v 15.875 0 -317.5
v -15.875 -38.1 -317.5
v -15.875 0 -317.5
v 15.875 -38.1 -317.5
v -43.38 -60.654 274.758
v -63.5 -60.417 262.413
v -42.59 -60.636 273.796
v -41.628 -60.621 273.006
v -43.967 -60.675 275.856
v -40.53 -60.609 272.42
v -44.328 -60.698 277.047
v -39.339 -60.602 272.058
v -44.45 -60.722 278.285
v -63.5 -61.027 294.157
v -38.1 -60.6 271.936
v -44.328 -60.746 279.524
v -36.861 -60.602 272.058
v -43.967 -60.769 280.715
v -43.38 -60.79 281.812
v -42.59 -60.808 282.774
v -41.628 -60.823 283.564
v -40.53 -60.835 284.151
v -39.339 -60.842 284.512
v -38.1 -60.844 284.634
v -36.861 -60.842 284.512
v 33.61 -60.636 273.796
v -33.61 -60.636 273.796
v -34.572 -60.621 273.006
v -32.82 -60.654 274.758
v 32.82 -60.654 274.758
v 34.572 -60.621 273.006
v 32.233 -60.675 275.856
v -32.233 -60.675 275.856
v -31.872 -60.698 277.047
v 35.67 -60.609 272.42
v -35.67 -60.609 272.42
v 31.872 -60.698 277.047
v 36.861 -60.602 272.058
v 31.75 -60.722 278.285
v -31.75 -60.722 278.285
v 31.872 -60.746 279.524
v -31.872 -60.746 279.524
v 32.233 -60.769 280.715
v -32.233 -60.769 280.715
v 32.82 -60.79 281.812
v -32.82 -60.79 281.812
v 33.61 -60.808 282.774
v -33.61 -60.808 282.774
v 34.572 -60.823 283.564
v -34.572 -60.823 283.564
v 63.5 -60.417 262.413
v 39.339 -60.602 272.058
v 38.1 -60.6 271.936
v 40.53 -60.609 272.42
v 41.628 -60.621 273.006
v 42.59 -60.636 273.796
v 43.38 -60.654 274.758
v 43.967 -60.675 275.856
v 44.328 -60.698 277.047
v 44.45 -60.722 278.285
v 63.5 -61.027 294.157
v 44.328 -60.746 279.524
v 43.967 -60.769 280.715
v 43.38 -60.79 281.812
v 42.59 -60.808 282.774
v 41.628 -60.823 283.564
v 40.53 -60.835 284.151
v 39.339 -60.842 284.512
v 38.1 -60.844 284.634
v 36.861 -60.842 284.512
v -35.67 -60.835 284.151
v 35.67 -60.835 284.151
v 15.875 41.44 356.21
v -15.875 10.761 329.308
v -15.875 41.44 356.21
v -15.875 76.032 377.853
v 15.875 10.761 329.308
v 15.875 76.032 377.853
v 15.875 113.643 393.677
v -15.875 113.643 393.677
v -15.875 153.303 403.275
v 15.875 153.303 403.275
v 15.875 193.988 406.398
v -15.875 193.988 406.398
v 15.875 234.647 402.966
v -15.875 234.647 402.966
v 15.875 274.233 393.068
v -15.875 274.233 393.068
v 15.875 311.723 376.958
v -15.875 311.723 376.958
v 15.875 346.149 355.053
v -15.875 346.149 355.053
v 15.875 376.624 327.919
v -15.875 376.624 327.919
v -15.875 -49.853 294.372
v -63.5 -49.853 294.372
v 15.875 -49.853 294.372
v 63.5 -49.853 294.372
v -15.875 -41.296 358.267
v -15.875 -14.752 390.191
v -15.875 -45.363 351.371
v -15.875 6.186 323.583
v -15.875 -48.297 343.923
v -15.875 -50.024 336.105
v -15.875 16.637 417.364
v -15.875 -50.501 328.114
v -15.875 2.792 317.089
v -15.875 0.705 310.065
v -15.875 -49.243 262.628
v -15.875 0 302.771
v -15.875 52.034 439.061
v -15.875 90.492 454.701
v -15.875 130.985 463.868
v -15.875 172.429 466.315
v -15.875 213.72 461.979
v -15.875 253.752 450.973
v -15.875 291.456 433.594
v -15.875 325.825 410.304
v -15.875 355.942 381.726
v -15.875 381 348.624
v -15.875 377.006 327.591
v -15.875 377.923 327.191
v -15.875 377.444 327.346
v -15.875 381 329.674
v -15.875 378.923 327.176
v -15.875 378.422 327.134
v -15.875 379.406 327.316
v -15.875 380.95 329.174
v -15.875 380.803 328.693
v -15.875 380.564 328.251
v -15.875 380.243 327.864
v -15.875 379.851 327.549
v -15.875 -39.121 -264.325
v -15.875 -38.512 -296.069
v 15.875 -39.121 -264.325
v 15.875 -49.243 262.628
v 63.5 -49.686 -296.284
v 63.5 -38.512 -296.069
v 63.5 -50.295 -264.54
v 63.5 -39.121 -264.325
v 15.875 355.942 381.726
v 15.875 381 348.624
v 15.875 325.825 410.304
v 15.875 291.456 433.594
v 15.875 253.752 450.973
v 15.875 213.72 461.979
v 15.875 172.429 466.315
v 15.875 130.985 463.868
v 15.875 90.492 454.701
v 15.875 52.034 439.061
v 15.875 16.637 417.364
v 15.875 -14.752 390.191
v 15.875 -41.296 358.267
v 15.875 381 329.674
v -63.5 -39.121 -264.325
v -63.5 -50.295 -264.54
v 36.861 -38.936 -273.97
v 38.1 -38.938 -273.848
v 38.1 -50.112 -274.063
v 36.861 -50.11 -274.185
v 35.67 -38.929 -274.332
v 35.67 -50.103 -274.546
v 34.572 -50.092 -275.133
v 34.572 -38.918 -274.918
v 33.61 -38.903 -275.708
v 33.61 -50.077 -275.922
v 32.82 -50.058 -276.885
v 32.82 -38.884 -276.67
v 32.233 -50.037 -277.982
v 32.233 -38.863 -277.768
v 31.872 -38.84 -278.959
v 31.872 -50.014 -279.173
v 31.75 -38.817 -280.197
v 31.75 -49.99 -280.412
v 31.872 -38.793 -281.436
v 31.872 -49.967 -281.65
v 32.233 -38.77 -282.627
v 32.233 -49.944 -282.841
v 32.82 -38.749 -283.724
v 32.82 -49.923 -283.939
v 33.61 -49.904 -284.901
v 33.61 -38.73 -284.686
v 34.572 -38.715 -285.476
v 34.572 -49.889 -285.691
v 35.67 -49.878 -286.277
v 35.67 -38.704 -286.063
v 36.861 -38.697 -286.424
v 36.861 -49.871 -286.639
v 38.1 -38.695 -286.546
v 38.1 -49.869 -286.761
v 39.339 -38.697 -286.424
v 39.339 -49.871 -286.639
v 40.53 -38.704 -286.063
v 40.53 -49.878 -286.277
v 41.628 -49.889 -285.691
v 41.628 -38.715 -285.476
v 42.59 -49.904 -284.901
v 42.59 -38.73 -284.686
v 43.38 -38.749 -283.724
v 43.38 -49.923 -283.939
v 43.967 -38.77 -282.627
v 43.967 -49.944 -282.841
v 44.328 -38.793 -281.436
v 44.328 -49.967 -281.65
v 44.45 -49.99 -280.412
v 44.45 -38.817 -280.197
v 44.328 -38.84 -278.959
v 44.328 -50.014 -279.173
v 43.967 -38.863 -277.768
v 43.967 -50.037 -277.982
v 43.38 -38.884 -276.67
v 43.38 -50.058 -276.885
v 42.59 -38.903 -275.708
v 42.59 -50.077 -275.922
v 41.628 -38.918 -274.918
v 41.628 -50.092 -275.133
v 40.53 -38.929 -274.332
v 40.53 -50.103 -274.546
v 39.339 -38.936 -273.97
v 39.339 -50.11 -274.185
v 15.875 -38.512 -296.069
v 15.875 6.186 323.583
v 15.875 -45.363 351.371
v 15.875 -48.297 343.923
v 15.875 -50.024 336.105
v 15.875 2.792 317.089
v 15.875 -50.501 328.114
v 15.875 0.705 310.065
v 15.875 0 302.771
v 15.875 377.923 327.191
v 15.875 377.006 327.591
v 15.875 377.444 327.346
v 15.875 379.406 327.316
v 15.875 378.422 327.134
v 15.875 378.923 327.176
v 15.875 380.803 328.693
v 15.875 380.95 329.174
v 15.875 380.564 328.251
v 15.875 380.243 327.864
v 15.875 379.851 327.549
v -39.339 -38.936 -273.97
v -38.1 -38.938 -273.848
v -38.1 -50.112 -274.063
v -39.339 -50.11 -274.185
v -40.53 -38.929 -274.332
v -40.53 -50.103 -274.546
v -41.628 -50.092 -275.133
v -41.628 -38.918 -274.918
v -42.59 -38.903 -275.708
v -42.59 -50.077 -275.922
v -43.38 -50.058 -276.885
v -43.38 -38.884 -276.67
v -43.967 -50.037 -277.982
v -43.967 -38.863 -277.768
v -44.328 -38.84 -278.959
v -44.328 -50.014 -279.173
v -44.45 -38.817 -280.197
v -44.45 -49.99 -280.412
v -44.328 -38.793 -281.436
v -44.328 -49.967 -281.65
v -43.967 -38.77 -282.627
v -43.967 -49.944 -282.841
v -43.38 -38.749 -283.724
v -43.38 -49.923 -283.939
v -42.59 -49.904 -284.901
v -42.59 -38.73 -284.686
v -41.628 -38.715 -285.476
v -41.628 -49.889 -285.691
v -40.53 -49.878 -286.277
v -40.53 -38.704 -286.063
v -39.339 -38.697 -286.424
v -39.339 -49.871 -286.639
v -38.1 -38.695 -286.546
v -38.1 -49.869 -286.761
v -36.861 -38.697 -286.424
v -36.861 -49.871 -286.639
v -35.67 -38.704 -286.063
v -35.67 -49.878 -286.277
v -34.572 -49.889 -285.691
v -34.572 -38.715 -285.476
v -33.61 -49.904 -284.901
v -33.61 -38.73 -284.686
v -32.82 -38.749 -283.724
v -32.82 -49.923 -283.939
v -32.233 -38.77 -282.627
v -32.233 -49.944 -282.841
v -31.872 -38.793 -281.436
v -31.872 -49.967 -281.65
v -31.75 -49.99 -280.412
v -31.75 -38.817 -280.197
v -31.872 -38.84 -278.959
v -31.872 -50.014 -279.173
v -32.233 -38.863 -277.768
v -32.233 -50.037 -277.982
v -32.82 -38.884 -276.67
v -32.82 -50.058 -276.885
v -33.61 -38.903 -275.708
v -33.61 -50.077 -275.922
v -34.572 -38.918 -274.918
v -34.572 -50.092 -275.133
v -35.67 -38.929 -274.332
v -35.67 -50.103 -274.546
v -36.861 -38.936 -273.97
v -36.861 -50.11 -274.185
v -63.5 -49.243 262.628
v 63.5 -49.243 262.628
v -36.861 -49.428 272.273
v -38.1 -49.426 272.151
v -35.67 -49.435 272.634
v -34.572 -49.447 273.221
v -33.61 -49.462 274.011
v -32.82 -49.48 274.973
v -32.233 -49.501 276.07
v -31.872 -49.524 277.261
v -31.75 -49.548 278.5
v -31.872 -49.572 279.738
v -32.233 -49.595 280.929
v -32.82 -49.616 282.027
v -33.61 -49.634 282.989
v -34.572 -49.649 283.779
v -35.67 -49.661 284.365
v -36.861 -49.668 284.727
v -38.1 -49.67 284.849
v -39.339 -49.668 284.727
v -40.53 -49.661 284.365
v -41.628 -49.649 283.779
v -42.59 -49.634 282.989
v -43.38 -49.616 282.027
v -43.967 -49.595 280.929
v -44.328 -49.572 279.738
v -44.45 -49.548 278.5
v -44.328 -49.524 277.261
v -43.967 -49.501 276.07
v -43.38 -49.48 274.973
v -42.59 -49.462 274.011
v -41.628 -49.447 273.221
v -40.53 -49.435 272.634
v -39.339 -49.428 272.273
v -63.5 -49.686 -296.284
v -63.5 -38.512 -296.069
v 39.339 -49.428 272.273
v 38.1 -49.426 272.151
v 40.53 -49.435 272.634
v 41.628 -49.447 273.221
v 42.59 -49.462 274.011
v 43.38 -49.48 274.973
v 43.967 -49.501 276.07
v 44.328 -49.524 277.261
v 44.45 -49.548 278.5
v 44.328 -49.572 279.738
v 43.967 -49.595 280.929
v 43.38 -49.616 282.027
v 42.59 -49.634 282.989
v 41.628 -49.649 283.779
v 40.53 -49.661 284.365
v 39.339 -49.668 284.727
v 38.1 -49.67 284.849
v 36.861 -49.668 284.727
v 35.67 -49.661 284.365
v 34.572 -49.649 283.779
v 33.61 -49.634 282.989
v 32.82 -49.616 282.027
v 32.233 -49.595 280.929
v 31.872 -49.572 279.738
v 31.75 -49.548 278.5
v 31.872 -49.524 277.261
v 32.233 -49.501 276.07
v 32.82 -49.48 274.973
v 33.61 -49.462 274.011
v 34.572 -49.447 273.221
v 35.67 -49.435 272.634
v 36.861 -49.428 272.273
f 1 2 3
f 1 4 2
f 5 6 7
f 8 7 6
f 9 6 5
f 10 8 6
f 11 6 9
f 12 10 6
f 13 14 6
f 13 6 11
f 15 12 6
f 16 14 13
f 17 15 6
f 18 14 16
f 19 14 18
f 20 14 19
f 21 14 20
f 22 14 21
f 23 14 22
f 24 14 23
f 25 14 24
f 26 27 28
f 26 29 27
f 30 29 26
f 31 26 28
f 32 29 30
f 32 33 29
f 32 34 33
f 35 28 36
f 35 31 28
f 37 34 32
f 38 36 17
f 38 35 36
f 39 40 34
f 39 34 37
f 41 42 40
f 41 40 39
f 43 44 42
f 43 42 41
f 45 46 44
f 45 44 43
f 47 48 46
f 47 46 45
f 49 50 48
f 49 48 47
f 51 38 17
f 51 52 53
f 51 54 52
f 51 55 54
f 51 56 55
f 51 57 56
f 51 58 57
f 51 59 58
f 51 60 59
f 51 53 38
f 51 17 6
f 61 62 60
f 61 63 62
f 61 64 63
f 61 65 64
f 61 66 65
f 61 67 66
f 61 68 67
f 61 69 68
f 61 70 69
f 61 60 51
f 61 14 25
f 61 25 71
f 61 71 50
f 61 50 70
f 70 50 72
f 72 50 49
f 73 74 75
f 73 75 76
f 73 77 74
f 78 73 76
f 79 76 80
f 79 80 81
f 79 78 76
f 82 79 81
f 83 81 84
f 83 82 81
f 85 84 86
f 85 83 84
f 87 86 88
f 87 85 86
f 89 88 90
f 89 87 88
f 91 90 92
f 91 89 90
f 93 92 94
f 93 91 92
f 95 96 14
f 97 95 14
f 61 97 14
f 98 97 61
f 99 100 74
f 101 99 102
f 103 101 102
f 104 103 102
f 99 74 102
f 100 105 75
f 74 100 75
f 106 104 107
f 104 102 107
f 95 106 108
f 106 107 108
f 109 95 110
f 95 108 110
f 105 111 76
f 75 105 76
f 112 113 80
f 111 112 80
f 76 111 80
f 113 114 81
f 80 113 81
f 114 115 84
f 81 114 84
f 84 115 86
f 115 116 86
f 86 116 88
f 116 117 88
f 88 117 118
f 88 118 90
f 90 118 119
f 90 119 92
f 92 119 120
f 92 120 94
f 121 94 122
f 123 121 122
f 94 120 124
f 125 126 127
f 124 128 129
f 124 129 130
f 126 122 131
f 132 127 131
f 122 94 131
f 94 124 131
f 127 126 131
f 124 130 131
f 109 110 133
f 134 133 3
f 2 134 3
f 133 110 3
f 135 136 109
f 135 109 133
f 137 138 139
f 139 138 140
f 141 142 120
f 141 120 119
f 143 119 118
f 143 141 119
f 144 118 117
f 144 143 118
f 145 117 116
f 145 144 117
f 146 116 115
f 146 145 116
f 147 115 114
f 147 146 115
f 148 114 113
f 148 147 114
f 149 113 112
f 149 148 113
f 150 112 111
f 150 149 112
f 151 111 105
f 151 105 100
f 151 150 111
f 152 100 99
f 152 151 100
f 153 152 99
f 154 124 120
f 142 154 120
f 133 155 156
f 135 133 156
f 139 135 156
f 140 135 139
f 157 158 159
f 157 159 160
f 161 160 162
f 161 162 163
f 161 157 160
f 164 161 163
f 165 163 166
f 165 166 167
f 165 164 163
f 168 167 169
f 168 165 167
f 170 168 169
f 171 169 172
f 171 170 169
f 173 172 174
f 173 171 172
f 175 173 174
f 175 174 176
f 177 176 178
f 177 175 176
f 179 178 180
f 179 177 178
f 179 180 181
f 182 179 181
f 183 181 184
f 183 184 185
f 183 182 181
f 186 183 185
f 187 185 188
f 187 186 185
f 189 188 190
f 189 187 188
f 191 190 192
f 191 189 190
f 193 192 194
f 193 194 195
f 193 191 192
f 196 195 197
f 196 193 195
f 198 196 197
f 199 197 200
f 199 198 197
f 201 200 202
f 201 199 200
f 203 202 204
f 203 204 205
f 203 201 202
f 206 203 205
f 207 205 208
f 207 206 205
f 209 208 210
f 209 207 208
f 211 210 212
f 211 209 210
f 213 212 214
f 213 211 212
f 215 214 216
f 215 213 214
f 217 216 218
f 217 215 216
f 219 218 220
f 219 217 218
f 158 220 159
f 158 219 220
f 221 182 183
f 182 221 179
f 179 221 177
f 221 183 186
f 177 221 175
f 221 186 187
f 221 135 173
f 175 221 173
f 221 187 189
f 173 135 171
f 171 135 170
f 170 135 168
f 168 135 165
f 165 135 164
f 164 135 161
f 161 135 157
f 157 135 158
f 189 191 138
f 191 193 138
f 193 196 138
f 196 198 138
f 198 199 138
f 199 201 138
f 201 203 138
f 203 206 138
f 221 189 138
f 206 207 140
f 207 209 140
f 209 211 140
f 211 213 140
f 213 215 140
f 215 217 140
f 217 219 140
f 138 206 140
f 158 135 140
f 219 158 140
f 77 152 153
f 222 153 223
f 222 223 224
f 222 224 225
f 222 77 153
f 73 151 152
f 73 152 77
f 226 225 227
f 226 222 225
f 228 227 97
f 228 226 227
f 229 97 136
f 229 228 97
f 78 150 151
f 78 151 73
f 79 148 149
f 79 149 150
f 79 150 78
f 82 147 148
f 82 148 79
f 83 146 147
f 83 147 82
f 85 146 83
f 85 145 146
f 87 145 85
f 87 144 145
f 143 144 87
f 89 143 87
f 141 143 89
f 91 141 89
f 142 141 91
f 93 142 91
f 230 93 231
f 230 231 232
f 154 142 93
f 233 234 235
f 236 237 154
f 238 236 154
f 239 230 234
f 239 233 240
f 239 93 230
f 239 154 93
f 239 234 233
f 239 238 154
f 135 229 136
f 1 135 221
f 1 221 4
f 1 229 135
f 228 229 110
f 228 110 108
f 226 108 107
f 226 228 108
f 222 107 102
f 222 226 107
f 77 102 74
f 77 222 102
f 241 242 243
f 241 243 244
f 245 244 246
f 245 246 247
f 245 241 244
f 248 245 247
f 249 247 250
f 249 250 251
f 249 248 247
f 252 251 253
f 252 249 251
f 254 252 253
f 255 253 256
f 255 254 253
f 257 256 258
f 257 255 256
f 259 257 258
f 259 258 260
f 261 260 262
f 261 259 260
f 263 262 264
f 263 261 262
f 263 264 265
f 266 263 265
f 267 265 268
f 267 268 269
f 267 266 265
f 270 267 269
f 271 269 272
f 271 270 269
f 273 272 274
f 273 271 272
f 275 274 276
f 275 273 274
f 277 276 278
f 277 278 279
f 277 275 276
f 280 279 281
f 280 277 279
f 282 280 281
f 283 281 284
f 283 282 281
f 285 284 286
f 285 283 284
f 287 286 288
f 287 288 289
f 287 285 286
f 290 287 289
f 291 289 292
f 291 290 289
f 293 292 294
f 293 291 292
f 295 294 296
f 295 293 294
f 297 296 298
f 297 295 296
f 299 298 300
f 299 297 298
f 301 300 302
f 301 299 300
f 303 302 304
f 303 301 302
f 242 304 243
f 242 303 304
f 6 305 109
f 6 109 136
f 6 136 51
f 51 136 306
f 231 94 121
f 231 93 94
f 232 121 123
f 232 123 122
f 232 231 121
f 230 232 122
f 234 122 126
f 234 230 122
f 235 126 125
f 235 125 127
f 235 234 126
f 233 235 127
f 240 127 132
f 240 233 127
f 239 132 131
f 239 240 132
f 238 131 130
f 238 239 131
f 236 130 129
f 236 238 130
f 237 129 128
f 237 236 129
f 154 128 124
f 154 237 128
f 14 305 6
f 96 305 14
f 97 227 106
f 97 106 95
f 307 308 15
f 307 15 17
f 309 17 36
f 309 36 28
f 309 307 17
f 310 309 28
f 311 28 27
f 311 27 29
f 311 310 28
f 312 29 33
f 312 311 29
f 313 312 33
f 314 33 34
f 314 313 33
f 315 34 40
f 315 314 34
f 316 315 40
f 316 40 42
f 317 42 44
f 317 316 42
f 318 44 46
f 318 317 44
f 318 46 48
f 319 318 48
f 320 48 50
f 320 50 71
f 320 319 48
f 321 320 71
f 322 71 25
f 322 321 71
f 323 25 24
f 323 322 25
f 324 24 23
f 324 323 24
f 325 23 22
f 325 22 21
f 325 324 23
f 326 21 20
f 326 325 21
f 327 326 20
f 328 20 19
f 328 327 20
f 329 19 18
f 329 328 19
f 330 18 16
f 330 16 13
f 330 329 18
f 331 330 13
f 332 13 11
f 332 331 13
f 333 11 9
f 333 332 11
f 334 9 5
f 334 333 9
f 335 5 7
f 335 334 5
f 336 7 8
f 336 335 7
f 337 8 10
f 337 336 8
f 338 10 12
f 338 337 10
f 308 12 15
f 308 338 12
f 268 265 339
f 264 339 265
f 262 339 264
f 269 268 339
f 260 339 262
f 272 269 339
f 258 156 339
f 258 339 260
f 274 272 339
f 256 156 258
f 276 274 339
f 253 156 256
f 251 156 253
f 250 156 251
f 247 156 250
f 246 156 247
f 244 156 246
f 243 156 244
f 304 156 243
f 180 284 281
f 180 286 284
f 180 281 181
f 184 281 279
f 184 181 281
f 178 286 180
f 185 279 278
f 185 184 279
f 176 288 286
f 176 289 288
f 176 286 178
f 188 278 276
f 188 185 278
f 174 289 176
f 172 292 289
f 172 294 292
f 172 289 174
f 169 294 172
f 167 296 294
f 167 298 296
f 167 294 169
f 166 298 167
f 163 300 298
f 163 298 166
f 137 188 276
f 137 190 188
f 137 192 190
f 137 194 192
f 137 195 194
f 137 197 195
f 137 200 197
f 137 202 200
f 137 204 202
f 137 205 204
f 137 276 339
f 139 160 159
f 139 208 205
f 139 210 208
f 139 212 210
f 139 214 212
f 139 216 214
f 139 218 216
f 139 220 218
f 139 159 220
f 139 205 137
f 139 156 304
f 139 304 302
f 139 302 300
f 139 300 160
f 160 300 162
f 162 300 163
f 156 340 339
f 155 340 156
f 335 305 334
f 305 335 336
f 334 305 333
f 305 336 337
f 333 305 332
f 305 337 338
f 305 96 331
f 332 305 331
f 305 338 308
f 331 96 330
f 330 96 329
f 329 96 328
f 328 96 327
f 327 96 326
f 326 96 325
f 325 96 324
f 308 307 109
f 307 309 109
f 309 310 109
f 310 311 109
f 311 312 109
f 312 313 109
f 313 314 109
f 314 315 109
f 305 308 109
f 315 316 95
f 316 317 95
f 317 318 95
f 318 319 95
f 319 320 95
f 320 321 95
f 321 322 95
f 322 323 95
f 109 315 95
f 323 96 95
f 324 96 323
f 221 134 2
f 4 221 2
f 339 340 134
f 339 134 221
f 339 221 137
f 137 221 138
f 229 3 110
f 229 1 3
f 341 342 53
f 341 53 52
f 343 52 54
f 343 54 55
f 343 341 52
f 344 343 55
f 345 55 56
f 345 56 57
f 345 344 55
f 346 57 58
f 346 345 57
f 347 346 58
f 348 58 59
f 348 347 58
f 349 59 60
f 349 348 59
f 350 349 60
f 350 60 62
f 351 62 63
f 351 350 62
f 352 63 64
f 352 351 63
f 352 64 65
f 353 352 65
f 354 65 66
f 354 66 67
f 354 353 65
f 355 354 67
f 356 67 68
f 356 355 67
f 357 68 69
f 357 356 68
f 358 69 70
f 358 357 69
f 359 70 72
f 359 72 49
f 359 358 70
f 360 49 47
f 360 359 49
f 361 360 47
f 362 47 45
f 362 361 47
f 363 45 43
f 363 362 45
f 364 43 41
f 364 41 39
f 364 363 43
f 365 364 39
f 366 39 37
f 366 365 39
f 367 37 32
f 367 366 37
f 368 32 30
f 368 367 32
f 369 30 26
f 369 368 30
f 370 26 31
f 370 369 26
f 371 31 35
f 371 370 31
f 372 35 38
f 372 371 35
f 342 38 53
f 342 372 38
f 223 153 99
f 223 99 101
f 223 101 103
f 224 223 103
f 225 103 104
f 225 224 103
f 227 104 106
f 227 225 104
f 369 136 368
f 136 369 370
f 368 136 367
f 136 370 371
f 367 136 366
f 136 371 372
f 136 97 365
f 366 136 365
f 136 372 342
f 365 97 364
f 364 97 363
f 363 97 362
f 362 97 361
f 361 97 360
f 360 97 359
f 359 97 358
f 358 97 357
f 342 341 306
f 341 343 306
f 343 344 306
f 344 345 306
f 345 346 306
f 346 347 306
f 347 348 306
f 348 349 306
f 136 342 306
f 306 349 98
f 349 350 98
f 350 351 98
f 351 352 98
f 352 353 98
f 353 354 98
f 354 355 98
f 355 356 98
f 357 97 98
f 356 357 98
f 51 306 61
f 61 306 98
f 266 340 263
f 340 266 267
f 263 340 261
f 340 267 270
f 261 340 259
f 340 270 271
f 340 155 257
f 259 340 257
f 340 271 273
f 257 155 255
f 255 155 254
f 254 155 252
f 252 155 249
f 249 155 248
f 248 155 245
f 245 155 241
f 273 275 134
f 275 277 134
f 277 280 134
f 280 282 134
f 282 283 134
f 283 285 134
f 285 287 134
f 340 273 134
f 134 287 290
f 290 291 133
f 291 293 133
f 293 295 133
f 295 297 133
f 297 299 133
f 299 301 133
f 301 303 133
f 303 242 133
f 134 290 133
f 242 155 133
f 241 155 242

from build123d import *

# Parameters (mm, degrees)
BOSS_EXTRUDE1_DEPTH = 15.875
SKETCH2_W           = 127
SKETCH2_H           = 31.75
SKETCH2_R           = 6.35
BOSS_EXTRUDE2_DEPTH = 11.176
FILLET1_R           = 2.54


with BuildPart() as part:
    # Sketch1 → Boss-Extrude1 (new, symmetric)
    with BuildSketch(Plane(origin=(0, 0, 0), x_dir=(0, 0, -1), z_dir=(1, 0, 0))):
        with BuildLine():
            Line((317.5, 0), (-302.771488663, 0))
            ThreePointArc((-302.771488663, 0), (-317.088938009, 2.792484593), (-329.307633721, 10.760596103))
            ThreePointArc((-329.307633721, 10.760596103), (-406.365714437, 197.196523766), (-323.223757211, 381))
            Line((-323.223757211, 381), (-348.623757211, 381))
            ThreePointArc((-348.623757211, 381), (-466.315322723, 172.429486078), (-358.266662239, -41.295689879))
            ThreePointArc((-358.266662239, -41.295689879), (-343.922523577, -48.296611465), (-328.11404497, -50.500975578))
            Line((-328.11404497, -50.500975578), (317.5, -38.1))
            Line((317.5, -38.1), (317.5, 0))
        make_face()
    extrude(amount=BOSS_EXTRUDE1_DEPTH, both=True)

    # Sketch2 → Boss-Extrude2 (add)
    # profile 1 of 2: a face of its own
    with BuildSketch(Plane(origin=(0, -44.182249353, -0.848654083), x_dir=(1, 0, 0), z_dir=(0, -0.9998155767735977, -0.019204490122845825))):
        with Locations((0, 279.4)):
            Rectangle(SKETCH2_W, SKETCH2_H)
        with Locations(Location((38.1, 279.4, 0), (0, 0, 270))):
            Circle(SKETCH2_R, mode=Mode.SUBTRACT)
        with Locations(Location((-38.1, 279.4, 0), (0, 0, 270))):
            Circle(SKETCH2_R, mode=Mode.SUBTRACT)
    # profile 2 of 2: a face of its own
    with BuildSketch(Plane(origin=(0, -44.182249353, -0.848654083), x_dir=(1, 0, 0), z_dir=(0, -0.9998155767735977, -0.019204490122845825))):
        with Locations((0, -279.4)):
            Rectangle(SKETCH2_W, SKETCH2_H)
        with Locations(Location((-38.1, -279.4, 0), (0, 0, 90))):
            Circle(SKETCH2_R, mode=Mode.SUBTRACT)
        with Locations(Location((38.1, -279.4, 0), (0, 0, 90))):
            Circle(SKETCH2_R, mode=Mode.SUBTRACT)
    extrude(amount=BOSS_EXTRUDE2_DEPTH)

    # Fillet1
    fillet1_edges = [part.edges().sort_by_distance(p)[0] for p in [
        (0, 381, 323.223757211),
    ]]
    fillet(fillet1_edges, radius=FILLET1_R)


solid = part.part
